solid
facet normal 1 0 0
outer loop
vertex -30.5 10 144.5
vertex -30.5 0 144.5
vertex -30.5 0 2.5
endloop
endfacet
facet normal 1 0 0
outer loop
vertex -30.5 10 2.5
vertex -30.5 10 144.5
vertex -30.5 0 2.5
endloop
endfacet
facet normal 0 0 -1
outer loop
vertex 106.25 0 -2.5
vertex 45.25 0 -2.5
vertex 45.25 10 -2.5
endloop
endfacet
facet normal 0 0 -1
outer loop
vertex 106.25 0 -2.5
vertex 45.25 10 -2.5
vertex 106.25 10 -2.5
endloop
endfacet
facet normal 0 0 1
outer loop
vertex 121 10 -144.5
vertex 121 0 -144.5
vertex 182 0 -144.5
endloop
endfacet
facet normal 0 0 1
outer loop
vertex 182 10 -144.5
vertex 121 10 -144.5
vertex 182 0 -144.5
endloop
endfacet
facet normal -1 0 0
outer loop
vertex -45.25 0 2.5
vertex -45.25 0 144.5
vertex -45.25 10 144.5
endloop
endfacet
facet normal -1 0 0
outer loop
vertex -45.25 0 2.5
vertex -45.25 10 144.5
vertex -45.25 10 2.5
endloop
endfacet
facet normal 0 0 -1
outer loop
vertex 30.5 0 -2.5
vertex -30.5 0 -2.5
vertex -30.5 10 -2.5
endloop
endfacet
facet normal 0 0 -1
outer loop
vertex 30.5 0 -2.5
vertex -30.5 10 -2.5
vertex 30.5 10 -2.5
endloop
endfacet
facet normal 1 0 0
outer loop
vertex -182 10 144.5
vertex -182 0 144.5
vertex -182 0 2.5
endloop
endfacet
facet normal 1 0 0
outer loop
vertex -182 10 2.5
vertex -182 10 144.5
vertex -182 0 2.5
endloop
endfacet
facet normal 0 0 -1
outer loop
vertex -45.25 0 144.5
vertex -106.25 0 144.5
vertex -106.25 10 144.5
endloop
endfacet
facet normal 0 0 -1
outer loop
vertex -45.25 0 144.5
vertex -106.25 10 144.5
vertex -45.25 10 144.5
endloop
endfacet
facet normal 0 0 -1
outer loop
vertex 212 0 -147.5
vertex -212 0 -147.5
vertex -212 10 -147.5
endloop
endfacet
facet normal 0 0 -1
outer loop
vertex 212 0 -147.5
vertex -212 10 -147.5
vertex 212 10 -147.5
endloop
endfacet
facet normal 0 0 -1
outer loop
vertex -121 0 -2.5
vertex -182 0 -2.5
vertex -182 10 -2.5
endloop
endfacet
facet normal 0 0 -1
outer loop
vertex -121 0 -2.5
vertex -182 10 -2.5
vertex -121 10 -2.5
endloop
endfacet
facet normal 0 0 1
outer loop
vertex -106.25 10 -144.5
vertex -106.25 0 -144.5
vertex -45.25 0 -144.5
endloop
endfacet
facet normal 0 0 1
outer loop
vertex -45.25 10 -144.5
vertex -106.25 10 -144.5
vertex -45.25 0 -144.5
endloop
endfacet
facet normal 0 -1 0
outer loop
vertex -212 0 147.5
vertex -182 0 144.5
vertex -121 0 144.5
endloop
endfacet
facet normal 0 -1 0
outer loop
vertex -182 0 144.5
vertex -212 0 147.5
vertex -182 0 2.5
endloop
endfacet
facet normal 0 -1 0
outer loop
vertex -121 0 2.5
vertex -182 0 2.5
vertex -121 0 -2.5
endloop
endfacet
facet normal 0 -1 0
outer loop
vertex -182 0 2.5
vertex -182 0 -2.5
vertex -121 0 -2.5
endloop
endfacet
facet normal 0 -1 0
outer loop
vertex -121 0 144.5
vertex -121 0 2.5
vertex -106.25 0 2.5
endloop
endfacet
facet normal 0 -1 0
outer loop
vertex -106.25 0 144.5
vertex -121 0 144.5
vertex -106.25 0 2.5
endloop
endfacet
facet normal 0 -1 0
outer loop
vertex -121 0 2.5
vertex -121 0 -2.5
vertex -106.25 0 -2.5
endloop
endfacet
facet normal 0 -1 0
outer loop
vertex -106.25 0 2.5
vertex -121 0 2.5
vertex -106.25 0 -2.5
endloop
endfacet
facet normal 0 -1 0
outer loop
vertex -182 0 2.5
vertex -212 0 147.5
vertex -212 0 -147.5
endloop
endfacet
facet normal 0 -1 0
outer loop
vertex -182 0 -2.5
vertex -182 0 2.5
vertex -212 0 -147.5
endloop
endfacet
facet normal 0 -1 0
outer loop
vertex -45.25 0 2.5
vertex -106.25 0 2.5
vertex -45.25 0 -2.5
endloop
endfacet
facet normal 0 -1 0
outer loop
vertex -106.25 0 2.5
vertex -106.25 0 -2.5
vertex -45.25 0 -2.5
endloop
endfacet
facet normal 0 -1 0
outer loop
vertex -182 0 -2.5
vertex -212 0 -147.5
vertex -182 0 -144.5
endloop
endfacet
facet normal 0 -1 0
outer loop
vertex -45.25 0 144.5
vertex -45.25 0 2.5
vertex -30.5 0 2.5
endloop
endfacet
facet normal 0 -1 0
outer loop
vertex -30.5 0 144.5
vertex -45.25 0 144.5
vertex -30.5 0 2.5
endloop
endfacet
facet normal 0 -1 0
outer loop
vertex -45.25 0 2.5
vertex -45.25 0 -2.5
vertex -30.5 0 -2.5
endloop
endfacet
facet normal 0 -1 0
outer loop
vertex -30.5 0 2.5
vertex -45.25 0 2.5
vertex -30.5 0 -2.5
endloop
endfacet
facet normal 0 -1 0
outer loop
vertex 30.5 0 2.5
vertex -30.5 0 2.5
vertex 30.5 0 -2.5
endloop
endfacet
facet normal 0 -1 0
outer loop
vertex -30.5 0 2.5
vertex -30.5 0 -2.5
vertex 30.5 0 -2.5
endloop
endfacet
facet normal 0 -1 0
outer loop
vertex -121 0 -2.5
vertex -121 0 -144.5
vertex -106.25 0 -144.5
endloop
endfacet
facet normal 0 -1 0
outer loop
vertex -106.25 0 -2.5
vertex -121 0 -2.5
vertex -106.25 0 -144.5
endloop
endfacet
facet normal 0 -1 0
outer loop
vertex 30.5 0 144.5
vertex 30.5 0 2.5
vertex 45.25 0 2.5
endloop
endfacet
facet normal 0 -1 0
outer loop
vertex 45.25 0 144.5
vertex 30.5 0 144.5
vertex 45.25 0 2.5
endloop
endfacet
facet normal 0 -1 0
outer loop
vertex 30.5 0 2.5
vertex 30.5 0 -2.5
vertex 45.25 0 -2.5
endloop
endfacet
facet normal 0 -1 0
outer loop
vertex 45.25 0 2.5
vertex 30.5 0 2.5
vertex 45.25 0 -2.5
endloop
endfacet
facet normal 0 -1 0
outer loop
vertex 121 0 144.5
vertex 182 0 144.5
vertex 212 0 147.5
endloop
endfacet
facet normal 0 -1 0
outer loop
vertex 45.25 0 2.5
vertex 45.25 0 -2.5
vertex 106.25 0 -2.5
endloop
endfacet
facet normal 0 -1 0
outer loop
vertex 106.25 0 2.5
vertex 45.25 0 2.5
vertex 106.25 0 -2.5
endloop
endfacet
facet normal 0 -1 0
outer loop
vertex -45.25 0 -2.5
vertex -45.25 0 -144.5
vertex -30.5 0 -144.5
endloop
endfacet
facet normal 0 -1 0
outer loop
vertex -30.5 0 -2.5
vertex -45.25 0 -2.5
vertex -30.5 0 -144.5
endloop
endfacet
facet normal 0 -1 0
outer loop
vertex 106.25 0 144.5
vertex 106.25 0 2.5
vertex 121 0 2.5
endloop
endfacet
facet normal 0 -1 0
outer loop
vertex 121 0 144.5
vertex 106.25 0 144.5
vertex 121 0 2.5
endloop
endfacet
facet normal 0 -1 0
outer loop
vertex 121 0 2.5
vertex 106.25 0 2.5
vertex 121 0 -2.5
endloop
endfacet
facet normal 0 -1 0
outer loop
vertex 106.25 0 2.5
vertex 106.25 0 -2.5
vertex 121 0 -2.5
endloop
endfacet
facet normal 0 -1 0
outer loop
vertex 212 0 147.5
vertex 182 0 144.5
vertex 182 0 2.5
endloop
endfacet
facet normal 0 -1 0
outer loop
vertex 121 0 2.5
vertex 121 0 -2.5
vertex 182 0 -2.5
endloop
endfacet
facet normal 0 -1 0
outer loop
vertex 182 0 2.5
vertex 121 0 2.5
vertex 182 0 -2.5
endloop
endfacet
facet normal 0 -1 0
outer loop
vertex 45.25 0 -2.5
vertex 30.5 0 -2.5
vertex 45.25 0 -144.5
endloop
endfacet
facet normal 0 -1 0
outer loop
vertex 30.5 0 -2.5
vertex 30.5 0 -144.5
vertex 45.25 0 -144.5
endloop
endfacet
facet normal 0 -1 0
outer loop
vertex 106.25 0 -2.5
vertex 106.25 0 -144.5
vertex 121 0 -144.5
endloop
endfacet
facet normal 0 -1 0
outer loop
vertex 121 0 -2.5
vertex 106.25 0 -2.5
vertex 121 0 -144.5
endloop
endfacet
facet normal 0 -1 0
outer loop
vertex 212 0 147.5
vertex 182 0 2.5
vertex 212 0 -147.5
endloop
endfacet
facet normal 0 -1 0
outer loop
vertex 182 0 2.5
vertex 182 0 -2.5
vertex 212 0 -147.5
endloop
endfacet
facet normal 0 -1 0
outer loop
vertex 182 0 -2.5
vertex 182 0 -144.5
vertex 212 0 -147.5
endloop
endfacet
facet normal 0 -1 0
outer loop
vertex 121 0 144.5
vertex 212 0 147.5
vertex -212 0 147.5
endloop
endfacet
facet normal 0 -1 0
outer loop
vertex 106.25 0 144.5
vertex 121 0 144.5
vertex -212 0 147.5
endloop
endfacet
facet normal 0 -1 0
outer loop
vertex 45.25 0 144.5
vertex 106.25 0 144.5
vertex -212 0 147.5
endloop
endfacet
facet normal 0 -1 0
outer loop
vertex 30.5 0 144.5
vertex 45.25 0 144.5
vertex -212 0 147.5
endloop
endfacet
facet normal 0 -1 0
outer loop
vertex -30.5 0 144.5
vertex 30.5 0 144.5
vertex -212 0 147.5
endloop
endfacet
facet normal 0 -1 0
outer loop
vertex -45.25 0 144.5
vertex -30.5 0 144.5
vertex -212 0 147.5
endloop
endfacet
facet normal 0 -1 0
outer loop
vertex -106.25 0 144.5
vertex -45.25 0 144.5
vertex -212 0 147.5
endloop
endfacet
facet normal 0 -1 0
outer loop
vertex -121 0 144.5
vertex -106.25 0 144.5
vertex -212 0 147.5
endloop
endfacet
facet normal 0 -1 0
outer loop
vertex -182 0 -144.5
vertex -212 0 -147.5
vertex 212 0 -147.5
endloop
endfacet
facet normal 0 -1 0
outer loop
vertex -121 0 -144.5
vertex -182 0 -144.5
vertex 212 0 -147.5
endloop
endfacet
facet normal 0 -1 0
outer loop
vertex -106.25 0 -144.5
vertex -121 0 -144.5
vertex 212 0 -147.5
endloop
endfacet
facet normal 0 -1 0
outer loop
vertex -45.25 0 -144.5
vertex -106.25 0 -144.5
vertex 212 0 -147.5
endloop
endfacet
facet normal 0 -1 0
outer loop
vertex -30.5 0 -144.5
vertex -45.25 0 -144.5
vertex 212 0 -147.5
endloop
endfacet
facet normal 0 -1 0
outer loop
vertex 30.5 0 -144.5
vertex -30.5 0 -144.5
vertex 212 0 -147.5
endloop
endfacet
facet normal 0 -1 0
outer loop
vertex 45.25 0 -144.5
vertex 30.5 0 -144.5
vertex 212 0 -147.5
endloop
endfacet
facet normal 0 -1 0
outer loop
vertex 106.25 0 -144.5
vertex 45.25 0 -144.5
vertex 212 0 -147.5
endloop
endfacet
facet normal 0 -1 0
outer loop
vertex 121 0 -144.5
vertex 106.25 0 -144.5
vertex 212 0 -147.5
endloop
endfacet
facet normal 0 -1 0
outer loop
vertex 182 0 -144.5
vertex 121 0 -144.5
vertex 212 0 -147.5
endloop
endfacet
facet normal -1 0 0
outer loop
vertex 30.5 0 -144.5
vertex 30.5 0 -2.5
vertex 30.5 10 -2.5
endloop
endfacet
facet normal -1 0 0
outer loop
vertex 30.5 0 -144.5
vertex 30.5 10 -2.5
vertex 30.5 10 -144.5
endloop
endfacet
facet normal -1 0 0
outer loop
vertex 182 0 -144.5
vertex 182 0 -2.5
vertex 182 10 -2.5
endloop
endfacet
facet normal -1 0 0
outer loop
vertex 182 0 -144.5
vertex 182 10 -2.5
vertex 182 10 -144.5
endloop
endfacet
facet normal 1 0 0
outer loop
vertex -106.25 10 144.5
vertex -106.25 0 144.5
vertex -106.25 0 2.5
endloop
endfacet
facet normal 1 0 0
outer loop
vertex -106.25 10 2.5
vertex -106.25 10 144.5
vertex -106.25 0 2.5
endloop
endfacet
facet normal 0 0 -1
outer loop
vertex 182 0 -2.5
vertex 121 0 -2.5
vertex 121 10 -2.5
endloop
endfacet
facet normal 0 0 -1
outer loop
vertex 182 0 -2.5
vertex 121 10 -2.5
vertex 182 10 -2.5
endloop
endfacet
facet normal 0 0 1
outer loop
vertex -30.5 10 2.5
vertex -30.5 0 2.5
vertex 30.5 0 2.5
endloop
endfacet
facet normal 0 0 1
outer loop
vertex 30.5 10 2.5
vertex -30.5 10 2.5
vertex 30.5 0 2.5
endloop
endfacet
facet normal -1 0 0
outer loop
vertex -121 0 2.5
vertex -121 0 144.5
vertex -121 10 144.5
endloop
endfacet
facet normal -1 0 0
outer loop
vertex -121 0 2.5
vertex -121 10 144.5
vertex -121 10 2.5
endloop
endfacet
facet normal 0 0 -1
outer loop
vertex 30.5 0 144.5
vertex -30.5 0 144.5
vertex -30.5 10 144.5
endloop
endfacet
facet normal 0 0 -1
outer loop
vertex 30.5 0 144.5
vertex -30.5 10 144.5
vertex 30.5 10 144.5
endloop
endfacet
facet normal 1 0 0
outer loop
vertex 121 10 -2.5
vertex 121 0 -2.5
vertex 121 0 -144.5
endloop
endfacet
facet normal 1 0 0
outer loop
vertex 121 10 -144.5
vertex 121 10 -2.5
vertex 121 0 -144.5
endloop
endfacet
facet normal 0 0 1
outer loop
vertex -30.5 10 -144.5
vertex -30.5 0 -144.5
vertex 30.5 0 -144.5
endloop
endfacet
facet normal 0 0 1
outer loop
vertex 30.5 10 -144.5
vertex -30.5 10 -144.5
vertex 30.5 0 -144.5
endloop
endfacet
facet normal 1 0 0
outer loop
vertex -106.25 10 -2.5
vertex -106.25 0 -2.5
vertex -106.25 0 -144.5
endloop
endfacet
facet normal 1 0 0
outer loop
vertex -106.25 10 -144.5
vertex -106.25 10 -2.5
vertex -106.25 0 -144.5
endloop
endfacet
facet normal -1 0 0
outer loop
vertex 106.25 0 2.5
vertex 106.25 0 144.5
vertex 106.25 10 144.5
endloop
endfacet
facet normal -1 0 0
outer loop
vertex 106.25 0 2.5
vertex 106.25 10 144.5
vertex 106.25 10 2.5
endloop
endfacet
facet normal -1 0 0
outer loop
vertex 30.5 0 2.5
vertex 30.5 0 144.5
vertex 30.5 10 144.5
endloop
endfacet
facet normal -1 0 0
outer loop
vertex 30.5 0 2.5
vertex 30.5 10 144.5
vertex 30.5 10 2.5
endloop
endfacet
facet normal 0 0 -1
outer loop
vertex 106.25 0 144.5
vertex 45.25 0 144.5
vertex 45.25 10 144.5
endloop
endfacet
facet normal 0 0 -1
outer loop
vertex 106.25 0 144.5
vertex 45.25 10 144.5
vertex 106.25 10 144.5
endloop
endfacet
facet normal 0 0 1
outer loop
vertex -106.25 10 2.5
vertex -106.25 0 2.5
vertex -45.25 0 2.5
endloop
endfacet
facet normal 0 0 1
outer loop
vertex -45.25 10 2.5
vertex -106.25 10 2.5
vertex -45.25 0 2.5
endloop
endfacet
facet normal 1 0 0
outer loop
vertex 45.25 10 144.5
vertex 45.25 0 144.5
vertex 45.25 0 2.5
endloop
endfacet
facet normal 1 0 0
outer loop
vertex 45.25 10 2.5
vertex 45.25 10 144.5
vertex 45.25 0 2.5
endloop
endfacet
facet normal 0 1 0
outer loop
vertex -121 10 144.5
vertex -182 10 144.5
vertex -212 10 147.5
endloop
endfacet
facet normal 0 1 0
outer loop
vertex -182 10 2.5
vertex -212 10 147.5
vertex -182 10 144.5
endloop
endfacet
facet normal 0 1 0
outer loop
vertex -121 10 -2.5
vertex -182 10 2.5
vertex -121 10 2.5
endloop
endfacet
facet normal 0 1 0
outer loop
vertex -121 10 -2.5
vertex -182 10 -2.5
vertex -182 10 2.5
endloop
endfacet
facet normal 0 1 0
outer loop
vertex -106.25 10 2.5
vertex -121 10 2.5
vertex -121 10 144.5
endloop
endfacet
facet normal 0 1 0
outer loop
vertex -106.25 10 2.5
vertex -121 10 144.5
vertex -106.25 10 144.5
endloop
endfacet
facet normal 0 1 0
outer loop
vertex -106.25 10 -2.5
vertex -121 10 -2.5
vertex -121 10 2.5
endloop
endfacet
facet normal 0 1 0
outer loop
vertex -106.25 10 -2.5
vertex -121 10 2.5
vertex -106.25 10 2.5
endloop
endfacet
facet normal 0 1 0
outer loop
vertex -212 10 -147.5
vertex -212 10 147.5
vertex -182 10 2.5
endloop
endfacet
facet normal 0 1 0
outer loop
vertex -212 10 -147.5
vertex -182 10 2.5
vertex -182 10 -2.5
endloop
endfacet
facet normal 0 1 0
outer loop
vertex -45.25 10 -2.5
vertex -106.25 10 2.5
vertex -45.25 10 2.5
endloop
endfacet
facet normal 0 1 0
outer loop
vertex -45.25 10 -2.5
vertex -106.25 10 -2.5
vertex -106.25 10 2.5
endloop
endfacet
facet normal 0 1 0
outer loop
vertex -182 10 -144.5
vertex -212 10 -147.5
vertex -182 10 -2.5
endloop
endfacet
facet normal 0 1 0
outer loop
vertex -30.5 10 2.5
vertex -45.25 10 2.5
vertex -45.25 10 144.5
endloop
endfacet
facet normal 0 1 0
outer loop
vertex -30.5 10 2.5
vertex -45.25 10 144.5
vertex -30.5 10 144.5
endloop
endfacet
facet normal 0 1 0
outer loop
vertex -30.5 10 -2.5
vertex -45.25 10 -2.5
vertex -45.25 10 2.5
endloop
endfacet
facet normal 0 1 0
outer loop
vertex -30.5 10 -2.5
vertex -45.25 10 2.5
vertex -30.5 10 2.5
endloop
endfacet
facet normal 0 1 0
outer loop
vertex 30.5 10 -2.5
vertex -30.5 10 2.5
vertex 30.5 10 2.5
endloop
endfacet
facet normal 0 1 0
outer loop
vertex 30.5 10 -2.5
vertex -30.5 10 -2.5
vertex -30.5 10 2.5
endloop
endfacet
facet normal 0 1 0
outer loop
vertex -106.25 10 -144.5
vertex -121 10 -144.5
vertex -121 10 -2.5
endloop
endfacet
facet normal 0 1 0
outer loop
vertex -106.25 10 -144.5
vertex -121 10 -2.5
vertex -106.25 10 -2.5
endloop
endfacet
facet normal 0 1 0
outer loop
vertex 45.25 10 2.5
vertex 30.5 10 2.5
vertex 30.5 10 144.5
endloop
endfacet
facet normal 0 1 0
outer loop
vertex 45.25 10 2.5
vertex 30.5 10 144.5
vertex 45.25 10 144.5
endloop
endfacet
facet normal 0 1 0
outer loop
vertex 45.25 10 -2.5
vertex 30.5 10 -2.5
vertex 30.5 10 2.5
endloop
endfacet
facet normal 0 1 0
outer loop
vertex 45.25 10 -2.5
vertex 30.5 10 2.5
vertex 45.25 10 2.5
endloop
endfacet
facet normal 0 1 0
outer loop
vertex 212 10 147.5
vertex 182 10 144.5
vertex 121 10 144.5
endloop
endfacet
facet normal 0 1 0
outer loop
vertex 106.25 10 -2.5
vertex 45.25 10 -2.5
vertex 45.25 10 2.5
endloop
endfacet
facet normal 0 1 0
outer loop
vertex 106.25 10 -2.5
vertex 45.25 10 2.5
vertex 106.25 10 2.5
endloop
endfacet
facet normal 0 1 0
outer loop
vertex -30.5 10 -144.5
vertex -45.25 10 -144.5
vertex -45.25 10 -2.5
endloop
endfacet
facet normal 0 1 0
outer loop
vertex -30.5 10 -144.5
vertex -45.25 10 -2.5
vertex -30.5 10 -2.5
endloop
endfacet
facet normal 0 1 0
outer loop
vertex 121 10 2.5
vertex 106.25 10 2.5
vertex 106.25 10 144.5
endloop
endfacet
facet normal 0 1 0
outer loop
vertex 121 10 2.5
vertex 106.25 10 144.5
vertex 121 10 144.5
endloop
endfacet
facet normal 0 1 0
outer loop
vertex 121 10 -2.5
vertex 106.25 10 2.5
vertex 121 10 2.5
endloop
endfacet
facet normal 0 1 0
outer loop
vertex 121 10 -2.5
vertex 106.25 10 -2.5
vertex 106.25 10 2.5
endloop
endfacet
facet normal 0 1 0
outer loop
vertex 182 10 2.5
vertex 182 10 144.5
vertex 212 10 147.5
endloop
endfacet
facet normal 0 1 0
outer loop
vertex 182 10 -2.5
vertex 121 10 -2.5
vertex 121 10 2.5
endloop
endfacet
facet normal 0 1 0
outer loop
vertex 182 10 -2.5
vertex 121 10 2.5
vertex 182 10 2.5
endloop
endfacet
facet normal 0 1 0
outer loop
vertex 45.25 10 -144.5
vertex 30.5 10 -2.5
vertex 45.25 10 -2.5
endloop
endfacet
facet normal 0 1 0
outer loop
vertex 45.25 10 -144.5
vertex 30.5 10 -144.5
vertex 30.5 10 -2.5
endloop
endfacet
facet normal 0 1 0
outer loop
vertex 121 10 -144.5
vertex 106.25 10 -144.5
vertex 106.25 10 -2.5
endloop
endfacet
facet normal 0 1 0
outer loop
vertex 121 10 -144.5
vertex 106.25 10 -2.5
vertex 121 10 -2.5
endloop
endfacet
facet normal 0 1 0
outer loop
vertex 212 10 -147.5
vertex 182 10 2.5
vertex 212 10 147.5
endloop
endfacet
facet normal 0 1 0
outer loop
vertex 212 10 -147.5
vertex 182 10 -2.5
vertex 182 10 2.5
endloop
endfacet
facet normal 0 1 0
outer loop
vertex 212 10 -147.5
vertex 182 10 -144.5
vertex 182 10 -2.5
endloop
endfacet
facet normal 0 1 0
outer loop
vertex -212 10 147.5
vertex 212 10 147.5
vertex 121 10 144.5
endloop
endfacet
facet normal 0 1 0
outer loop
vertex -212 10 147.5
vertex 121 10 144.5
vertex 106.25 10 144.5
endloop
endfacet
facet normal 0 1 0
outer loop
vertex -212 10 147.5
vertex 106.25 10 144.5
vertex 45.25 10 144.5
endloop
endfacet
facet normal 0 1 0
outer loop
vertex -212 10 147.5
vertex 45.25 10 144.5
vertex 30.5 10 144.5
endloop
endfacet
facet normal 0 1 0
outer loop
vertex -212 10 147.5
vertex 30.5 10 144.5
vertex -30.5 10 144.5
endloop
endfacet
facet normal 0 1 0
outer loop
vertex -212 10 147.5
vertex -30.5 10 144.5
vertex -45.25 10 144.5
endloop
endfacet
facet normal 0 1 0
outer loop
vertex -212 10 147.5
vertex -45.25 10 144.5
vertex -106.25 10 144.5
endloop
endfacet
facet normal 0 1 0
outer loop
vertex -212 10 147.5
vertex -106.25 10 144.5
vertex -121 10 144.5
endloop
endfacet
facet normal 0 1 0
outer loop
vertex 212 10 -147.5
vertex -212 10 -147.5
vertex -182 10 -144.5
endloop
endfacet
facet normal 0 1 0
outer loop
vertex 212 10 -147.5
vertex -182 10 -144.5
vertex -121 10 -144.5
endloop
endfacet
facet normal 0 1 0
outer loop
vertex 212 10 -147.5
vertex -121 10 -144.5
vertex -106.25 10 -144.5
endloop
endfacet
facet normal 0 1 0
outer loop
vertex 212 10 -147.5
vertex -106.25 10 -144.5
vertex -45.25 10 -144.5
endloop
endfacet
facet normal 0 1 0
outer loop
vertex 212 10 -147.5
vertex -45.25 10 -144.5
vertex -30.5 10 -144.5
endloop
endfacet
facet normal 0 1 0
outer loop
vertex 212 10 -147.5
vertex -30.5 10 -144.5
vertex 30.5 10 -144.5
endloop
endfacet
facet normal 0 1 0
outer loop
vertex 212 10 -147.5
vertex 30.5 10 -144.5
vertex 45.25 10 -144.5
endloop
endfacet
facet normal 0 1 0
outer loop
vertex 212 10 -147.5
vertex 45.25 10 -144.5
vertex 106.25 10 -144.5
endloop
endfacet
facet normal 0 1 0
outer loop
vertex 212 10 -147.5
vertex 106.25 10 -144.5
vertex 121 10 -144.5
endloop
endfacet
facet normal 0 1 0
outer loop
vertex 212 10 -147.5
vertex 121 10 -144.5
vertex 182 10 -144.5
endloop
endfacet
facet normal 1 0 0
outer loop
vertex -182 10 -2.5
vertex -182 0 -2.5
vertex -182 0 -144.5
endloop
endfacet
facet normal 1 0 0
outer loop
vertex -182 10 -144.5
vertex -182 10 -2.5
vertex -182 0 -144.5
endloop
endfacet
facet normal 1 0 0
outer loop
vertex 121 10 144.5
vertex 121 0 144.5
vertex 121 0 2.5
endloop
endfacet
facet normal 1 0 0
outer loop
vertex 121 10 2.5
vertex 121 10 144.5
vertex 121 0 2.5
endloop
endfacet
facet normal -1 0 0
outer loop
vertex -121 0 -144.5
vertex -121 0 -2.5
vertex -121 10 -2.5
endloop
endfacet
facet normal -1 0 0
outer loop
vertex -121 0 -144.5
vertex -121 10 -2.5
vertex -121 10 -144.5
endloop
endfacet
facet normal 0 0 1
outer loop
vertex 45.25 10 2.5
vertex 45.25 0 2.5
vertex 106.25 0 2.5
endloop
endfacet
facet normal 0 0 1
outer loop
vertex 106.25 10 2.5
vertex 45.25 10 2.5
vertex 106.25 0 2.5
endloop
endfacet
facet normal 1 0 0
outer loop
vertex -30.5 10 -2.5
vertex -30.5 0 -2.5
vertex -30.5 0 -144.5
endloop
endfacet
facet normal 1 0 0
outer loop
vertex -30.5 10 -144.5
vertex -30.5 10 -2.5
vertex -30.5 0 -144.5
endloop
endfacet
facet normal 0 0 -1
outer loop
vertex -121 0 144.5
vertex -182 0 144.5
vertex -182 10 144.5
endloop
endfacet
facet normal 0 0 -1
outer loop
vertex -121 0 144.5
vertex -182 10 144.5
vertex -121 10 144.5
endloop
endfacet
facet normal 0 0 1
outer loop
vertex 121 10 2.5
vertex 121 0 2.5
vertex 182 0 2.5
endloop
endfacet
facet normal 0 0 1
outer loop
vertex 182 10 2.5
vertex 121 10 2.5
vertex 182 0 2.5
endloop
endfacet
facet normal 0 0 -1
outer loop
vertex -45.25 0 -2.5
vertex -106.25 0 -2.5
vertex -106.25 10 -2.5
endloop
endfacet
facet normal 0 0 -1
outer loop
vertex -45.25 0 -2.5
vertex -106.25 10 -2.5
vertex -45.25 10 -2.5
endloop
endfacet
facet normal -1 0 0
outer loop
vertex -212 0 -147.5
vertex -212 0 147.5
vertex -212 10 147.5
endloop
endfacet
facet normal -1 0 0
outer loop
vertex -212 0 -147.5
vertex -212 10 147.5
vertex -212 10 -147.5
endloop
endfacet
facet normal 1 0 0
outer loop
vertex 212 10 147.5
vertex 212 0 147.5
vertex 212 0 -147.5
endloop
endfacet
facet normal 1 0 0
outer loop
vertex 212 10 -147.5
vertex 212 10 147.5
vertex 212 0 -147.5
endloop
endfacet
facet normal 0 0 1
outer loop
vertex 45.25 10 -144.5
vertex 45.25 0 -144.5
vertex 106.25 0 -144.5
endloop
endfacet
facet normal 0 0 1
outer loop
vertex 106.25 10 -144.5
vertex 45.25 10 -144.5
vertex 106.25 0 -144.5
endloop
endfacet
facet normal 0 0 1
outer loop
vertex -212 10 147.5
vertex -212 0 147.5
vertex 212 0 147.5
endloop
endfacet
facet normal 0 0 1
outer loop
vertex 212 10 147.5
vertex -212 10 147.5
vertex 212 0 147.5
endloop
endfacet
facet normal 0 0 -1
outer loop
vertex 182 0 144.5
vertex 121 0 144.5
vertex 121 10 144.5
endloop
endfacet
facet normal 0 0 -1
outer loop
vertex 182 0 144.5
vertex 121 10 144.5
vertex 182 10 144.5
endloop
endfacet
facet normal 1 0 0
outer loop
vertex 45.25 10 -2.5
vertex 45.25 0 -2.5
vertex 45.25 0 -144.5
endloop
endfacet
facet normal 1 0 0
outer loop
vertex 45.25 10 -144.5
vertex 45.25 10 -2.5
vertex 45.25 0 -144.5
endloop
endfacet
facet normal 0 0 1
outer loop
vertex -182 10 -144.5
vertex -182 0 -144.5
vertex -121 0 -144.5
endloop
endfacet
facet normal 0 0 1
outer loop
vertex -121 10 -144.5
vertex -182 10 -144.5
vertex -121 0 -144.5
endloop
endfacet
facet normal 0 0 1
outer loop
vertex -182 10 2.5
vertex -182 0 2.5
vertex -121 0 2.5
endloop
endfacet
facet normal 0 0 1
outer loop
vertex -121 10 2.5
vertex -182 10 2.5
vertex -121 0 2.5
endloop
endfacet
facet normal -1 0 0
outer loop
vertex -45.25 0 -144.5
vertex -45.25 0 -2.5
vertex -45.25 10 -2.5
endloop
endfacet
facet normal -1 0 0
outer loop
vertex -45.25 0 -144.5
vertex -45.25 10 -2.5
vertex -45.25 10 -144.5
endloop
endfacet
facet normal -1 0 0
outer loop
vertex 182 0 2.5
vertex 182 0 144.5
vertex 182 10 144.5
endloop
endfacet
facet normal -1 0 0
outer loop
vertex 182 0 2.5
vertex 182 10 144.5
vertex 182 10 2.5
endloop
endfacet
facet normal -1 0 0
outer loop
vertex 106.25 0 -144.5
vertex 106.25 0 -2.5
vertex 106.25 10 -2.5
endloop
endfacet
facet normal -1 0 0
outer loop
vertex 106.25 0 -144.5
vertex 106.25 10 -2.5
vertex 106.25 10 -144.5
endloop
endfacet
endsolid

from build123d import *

# Parameters (mm, degrees)
SKETCH1_W           = 424
SKETCH1_H           = 295
SKETCH1_W_2         = 61
SKETCH1_H_2         = 142
BOSS_EXTRUDE1_DEPTH = 10


with BuildPart() as part:
    # Sketch1 → Boss-Extrude1 (new body)
    with BuildSketch(Plane(origin=(0, 0, 0), x_dir=(1, 0, 0), z_dir=(0, 1, 0))):
        Rectangle(SKETCH1_W, SKETCH1_H)
        with Locations((-151.5, 73.5)):
            Rectangle(SKETCH1_W_2, SKETCH1_H_2, mode=Mode.SUBTRACT)
        with Locations((-75.75, 73.5)):
            Rectangle(SKETCH1_W_2, SKETCH1_H_2, mode=Mode.SUBTRACT)
        with Locations((0, 73.5)):
            Rectangle(SKETCH1_W_2, SKETCH1_H_2, mode=Mode.SUBTRACT)
        with Locations((75.75, 73.5)):
            Rectangle(SKETCH1_W_2, SKETCH1_H_2, mode=Mode.SUBTRACT)
        with Locations((151.5, 73.5)):
            Rectangle(SKETCH1_W_2, SKETCH1_H_2, mode=Mode.SUBTRACT)
        with Locations((151.5, -73.5)):
            Rectangle(SKETCH1_W_2, SKETCH1_H_2, mode=Mode.SUBTRACT)
        with Locations((75.75, -73.5)):
            Rectangle(SKETCH1_W_2, SKETCH1_H_2, mode=Mode.SUBTRACT)
        with Locations((0, -73.5)):
            Rectangle(SKETCH1_W_2, SKETCH1_H_2, mode=Mode.SUBTRACT)
        with Locations((-75.75, -73.5)):
            Rectangle(SKETCH1_W_2, SKETCH1_H_2, mode=Mode.SUBTRACT)
        with Locations((-151.5, -73.5)):
            Rectangle(SKETCH1_W_2, SKETCH1_H_2, mode=Mode.SUBTRACT)
    extrude(amount=BOSS_EXTRUDE1_DEPTH)


solid = part.part
